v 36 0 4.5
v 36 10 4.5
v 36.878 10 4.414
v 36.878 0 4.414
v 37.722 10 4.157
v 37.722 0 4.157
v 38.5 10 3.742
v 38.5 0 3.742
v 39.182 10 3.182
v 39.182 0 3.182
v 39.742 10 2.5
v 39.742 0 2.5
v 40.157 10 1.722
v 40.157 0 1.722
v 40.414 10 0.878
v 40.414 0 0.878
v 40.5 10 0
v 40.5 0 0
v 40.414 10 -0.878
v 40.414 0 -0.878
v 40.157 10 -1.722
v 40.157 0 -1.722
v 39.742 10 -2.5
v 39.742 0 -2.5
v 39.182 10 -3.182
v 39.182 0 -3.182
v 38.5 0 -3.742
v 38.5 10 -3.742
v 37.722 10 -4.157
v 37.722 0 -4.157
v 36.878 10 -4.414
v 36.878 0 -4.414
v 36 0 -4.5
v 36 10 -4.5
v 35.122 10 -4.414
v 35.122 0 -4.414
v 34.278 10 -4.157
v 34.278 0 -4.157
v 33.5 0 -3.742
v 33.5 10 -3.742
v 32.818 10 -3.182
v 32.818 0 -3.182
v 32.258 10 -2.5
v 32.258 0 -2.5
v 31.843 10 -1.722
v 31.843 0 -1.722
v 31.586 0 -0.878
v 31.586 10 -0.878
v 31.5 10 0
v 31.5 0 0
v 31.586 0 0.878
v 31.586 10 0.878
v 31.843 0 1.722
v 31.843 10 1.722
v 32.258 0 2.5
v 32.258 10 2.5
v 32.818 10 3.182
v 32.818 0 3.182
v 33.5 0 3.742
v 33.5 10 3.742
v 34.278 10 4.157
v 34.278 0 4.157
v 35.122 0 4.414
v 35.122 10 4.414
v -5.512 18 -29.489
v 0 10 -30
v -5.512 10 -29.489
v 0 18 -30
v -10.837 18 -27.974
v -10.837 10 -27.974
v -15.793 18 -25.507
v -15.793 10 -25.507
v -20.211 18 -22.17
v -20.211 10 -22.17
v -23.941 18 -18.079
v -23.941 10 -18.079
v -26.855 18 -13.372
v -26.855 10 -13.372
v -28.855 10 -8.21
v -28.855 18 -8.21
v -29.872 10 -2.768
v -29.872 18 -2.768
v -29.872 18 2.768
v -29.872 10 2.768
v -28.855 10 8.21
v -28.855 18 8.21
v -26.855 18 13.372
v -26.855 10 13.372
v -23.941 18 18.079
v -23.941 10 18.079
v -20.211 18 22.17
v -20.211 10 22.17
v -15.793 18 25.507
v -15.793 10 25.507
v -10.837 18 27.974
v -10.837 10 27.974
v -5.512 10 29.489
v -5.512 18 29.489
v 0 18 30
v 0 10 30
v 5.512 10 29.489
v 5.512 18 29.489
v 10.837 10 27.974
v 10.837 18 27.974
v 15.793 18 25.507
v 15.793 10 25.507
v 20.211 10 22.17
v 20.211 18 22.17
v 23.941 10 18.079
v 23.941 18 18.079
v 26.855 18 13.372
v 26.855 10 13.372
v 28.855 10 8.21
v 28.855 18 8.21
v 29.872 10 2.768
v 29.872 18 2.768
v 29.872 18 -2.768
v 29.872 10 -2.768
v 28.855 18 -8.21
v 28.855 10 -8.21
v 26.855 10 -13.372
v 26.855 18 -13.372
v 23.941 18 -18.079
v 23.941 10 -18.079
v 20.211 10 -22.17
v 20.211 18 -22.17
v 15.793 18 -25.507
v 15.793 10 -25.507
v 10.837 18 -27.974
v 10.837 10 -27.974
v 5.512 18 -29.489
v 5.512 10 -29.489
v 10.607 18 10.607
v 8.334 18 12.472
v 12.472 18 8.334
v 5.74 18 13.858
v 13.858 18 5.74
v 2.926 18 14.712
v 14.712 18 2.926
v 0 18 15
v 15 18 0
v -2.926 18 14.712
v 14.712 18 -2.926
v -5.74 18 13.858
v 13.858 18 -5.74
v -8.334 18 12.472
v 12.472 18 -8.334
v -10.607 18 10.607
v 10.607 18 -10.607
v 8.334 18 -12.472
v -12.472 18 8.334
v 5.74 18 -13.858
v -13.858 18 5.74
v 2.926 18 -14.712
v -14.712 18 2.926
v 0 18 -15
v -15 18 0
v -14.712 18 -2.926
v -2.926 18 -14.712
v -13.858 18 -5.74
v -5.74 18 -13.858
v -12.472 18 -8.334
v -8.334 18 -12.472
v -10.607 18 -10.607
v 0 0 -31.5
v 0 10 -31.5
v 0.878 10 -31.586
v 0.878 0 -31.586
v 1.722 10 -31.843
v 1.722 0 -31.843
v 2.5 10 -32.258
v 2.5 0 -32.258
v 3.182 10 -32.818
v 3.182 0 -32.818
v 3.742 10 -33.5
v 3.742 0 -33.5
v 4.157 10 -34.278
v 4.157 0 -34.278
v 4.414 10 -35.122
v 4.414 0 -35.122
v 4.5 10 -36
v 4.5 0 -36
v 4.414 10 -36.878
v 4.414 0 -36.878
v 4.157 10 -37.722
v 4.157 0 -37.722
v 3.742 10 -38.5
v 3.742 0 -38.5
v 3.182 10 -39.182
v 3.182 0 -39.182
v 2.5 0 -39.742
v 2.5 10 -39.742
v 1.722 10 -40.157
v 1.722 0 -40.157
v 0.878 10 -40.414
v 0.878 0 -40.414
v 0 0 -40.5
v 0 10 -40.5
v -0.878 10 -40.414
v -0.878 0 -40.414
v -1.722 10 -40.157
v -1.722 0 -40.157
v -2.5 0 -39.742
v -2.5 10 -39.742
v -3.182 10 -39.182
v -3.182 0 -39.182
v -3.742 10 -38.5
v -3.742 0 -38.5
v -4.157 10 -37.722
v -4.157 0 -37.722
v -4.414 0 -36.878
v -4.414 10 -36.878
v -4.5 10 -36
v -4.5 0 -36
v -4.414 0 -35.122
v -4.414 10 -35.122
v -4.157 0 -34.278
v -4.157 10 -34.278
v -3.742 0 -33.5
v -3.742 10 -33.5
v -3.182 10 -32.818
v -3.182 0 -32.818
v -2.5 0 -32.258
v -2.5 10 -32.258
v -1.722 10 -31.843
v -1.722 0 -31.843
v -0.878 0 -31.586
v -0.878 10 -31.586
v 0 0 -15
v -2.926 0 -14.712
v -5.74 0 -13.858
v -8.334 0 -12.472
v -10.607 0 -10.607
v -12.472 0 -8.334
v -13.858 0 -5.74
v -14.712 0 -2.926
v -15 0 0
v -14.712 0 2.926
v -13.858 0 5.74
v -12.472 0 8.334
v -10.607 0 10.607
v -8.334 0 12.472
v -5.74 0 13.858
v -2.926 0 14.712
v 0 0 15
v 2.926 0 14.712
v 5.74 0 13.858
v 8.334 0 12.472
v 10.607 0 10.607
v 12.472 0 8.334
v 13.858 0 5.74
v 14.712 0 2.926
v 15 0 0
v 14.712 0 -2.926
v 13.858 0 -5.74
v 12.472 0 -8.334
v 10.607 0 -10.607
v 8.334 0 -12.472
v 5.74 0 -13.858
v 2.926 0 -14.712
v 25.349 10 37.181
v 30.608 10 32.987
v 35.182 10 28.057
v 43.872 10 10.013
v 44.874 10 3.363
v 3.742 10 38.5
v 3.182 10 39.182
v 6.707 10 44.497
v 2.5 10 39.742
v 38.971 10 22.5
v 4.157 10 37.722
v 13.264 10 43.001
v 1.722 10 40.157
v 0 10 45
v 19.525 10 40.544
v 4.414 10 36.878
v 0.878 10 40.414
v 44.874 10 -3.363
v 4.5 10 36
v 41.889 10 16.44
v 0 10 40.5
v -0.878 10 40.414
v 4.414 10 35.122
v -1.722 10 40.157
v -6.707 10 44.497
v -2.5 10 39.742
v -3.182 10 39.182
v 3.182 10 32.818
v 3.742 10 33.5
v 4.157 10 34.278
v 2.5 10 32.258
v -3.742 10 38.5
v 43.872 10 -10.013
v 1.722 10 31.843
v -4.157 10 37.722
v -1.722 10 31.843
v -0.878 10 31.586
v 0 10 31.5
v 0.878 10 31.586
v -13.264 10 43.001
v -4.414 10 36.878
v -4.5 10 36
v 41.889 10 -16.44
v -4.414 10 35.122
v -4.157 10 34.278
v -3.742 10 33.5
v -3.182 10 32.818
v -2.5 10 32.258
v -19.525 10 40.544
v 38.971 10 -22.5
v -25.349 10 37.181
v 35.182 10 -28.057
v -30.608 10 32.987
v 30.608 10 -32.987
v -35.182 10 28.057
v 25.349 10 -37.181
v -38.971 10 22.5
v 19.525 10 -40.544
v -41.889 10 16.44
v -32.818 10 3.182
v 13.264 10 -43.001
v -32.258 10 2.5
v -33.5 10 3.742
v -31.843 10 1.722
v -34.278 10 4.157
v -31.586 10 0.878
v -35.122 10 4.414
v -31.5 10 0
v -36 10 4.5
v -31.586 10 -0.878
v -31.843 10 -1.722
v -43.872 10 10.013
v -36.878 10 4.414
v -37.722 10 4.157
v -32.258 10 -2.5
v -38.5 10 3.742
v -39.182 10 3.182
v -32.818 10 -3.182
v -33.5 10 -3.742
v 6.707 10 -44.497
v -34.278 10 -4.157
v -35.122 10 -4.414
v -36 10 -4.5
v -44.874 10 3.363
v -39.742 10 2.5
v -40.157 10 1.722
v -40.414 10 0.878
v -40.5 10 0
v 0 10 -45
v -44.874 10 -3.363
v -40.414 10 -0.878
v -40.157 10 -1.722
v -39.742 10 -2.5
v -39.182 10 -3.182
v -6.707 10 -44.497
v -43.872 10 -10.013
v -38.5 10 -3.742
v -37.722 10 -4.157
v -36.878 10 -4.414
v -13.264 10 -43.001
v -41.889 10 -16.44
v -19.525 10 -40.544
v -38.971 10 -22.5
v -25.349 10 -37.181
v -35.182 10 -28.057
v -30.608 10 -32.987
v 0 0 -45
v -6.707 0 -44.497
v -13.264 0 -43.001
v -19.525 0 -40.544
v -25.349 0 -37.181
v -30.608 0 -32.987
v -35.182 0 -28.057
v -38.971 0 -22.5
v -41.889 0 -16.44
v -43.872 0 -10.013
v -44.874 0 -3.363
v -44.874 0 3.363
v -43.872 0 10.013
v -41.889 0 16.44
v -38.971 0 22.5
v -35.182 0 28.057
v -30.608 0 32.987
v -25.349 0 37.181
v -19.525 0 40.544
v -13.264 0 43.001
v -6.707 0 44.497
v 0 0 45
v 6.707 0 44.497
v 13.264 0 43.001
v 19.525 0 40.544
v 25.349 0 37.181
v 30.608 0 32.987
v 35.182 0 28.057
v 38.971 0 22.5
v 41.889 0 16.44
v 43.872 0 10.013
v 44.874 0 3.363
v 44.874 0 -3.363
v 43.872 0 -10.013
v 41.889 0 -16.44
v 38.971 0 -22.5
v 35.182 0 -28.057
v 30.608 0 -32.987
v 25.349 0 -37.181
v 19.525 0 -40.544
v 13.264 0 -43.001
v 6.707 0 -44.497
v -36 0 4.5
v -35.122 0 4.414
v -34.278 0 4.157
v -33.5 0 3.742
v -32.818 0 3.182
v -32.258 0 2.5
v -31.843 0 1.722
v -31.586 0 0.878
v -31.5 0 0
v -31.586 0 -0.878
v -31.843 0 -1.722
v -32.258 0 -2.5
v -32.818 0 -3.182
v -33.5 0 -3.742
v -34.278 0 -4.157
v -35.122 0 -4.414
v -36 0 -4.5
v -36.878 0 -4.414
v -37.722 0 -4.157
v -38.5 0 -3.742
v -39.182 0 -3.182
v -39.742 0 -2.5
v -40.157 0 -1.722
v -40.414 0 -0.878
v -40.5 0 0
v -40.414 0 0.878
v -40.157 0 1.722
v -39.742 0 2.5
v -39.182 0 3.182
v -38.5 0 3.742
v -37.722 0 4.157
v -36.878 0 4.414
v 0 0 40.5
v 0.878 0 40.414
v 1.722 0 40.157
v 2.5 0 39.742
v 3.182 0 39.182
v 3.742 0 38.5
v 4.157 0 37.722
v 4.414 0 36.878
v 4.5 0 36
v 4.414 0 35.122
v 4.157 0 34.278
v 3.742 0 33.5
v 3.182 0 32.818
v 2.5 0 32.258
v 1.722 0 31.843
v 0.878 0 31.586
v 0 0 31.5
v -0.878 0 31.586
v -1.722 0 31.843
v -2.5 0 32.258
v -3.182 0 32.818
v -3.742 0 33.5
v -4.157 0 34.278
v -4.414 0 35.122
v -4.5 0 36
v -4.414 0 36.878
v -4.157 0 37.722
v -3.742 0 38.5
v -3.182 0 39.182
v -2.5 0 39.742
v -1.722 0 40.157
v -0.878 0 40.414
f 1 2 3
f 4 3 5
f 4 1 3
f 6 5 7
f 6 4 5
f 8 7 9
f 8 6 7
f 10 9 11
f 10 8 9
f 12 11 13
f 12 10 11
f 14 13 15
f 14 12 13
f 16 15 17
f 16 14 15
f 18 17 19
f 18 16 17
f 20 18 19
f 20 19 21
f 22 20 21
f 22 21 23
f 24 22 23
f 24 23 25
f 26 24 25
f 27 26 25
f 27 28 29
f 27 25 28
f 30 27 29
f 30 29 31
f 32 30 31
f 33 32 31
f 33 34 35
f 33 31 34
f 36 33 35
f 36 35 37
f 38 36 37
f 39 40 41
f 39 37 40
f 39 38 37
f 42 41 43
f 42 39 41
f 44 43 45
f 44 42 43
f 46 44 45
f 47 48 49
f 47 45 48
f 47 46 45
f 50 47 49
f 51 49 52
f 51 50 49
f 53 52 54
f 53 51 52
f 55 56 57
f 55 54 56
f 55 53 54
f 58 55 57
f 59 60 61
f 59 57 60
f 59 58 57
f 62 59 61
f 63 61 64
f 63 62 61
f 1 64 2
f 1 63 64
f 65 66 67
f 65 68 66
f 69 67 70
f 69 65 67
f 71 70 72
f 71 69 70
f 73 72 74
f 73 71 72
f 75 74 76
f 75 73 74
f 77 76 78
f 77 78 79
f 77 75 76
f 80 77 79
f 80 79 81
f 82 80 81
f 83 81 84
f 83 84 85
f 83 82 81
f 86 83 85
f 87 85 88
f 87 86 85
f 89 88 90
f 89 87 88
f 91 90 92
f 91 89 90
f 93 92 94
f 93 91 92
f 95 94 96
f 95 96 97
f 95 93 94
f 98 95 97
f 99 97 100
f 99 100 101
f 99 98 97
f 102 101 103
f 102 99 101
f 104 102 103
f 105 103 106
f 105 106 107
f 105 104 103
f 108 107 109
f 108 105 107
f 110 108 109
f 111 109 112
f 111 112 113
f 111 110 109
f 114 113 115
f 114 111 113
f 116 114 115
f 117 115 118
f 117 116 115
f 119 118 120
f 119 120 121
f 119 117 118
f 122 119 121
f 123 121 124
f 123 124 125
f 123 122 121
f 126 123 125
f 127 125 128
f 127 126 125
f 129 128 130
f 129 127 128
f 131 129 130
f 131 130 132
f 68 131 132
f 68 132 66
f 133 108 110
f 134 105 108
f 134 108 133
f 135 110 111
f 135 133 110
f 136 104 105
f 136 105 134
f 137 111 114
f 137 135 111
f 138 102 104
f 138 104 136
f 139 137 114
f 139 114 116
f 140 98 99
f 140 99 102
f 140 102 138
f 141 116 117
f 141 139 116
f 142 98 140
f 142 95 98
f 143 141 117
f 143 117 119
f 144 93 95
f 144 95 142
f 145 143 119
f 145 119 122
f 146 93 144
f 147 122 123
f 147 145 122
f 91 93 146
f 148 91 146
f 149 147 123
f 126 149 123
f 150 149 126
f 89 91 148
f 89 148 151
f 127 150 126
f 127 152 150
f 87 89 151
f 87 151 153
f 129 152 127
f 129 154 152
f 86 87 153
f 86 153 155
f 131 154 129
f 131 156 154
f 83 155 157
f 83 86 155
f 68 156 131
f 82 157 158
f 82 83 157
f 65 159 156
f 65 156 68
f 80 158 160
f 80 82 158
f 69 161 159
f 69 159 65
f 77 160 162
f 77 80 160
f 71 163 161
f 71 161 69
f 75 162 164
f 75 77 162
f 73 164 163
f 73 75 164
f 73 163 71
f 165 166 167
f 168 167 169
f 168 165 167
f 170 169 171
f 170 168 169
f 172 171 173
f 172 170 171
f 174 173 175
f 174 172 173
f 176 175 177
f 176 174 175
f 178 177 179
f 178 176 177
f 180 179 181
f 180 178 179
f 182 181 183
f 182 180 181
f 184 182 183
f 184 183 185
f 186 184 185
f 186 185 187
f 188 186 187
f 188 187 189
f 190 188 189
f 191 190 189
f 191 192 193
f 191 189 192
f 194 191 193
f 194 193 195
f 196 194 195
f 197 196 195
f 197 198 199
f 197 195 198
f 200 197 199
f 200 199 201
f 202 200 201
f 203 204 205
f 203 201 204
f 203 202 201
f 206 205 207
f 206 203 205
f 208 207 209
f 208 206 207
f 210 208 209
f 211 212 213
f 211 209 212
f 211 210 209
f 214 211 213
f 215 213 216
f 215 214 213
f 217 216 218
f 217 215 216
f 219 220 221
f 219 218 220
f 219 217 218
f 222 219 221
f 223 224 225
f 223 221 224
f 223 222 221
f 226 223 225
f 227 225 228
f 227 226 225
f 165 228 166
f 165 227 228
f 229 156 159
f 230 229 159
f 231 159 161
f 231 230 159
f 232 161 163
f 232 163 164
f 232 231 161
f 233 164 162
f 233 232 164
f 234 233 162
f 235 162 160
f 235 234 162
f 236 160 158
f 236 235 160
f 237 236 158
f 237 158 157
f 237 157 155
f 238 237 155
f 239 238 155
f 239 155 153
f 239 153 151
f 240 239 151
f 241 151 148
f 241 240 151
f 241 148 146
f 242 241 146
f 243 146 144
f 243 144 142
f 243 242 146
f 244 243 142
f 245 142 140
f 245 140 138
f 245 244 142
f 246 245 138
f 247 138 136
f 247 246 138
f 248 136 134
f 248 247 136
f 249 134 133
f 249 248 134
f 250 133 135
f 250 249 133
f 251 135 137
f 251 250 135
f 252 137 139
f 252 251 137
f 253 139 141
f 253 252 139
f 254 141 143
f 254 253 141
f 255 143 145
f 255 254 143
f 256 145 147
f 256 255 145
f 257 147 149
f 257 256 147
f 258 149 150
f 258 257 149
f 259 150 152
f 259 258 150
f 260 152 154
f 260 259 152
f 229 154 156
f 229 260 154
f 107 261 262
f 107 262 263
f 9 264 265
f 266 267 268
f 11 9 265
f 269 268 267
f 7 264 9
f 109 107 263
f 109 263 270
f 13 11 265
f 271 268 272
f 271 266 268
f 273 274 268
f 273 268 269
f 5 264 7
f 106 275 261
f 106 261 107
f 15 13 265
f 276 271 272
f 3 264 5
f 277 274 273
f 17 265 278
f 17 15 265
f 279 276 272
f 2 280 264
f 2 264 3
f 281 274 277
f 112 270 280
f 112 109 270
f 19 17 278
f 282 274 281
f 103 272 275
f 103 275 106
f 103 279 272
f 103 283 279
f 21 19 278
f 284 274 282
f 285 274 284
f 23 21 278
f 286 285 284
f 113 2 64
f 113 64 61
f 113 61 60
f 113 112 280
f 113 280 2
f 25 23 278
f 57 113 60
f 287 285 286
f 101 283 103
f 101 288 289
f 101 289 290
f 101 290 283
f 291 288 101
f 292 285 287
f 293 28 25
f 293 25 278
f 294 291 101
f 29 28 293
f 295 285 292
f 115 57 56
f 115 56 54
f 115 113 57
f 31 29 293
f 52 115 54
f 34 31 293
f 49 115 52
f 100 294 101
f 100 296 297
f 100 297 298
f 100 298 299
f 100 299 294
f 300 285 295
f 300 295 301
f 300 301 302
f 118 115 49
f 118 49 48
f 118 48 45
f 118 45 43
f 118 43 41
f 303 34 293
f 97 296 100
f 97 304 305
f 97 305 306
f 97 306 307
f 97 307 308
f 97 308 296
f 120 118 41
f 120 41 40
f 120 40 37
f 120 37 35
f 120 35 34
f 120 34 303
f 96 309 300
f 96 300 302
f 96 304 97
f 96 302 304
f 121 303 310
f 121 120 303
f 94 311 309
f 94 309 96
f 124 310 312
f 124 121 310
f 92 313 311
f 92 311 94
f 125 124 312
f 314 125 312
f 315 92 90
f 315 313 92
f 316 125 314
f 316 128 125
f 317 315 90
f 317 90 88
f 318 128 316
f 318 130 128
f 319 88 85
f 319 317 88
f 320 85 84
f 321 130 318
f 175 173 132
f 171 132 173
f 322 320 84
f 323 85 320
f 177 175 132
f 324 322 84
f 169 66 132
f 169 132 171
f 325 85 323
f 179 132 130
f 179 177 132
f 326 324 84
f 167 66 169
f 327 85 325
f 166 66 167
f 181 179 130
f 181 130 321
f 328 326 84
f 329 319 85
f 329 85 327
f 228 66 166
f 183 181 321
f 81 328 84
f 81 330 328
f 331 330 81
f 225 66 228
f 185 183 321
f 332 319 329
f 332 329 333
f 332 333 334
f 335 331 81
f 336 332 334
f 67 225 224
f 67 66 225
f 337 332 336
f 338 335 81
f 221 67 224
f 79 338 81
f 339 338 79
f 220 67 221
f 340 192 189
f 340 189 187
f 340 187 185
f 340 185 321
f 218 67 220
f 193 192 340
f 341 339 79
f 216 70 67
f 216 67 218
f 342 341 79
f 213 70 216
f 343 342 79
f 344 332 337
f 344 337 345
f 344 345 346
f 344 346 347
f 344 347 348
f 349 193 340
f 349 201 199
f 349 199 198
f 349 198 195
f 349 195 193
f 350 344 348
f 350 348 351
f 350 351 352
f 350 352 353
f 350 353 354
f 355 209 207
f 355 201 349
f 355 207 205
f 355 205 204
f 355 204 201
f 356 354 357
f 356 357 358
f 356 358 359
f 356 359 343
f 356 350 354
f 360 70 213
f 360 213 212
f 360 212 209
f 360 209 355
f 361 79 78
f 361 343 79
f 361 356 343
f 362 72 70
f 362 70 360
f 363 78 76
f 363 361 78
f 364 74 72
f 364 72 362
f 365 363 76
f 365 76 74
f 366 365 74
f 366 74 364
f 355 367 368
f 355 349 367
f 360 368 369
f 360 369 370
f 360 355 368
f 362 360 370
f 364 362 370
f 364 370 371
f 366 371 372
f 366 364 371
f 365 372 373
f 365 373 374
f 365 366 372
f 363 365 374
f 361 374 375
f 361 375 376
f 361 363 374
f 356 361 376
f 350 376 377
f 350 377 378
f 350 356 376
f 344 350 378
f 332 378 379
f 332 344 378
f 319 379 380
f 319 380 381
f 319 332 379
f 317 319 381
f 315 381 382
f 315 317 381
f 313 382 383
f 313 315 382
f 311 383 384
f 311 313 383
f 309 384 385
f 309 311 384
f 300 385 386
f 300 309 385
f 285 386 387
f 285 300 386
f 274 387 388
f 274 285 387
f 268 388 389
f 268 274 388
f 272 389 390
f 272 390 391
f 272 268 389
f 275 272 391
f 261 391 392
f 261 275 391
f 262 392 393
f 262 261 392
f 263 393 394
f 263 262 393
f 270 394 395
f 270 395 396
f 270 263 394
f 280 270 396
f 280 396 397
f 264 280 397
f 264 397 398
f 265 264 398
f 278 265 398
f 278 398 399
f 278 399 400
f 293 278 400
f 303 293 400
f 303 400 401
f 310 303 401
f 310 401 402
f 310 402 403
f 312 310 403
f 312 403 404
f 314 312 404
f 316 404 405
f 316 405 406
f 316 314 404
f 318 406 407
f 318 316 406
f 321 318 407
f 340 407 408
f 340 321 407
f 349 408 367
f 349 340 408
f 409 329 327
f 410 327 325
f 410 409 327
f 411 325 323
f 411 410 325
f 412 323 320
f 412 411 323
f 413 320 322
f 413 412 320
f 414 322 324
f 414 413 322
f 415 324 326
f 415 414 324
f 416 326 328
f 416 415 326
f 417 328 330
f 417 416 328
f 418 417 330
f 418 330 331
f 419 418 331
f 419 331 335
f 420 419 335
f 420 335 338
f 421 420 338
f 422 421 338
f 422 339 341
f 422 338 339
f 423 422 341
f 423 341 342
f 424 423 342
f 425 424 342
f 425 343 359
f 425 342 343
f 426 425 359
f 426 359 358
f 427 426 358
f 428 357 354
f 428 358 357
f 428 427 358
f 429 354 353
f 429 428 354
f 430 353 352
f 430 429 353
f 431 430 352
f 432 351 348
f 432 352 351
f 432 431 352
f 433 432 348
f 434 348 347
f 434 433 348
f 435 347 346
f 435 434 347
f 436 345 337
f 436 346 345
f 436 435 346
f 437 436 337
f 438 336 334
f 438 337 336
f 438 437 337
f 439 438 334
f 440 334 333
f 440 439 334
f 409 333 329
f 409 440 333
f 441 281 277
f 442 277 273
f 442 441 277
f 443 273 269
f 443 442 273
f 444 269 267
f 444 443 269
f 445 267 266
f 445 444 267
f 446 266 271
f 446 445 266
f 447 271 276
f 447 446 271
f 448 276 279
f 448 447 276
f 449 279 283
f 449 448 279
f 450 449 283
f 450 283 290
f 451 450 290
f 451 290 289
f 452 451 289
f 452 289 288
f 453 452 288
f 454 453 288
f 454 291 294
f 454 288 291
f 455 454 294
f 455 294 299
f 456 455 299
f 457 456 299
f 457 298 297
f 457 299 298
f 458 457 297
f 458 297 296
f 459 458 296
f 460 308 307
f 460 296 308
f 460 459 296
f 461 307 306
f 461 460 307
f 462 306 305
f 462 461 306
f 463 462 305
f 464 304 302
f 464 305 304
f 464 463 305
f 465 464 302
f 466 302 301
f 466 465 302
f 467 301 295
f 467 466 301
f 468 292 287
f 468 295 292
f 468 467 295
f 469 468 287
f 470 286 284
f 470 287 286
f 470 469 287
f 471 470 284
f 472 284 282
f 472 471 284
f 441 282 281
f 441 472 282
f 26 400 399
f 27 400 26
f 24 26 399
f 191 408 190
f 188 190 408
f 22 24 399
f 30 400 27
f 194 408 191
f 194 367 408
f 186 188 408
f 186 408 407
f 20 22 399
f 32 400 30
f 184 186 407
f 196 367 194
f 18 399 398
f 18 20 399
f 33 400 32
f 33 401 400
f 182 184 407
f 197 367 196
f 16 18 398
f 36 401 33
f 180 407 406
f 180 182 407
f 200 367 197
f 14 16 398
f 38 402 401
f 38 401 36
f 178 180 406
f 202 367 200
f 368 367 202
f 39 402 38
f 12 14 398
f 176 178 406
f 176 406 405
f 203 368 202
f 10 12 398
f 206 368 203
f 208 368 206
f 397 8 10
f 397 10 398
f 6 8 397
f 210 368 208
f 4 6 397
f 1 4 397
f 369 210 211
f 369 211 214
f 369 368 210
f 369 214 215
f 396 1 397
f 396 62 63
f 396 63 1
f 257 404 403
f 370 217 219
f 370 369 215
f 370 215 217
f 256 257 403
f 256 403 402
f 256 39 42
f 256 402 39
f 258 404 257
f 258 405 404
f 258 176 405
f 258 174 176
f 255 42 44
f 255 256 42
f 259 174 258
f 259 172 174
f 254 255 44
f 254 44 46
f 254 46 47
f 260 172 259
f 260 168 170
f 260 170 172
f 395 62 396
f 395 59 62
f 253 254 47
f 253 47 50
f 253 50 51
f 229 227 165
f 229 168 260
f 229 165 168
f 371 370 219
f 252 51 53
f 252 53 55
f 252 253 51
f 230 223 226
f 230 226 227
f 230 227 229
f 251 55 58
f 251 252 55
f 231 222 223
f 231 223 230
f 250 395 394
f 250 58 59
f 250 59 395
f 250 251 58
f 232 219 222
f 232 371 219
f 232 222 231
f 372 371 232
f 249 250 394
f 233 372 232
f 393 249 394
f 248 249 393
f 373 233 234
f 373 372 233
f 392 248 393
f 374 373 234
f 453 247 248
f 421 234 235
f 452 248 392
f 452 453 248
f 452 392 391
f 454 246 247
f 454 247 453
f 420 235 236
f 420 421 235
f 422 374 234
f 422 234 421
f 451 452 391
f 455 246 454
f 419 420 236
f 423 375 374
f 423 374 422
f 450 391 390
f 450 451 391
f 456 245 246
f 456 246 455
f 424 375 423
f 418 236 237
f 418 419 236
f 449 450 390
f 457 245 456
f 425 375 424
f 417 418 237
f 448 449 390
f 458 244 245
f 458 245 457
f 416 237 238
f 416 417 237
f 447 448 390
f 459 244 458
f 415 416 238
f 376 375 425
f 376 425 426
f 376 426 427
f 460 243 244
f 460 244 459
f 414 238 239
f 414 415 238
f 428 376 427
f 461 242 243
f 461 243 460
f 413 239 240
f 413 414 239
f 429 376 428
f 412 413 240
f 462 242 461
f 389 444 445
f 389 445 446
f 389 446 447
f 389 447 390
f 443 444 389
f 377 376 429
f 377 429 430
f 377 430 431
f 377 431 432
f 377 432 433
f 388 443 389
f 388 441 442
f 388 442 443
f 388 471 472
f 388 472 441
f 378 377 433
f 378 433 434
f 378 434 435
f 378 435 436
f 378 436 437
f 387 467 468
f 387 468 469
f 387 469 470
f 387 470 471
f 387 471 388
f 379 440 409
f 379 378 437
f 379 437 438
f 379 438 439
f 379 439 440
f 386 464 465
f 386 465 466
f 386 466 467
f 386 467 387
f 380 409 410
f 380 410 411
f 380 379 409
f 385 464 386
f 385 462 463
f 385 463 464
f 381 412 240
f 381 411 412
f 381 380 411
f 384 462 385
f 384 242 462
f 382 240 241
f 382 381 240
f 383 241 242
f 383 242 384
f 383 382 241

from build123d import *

# Parameters (mm, degrees)
SKETCH_2_R          = 4.5
CUT_EXTRUDE_1_DEPTH = 67.136223055


with BuildPart() as part:
    # 草图1 → 旋转1 (revolve)
    with BuildSketch(Plane.XY, mode=Mode.PRIVATE) as revolve_1_sk:
        Polygon((15, 0), (45, 0), (45, 10), (30, 10), (30, 18), (15, 18), align=None)
    revolve(revolve_1_sk.sketch.rotate(Axis((0, -10, 0), (0, 1, 0)), 90), axis=Axis((0, -10, 0), (0, 1, 0)))

    # 草图2 → 切除-拉伸1 (cut, through all)
    with BuildSketch(Plane(origin=(0, 0, 0), x_dir=(1, 0, 0), z_dir=(0, 1, 0))):
        with Locations(Location((36, 0, 0), (0, 0, 270))):
            Circle(SKETCH_2_R)
        with Locations(Location((0, 36, 0), (0, 0, 270))):
            Circle(SKETCH_2_R)
        with Locations(Location((-36, 0, 0), (0, 0, 270))):
            Circle(SKETCH_2_R)
        with Locations(Location((0, -36, 0), (0, 0, 270))):
            Circle(SKETCH_2_R)
    extrude(amount=CUT_EXTRUDE_1_DEPTH, mode=Mode.SUBTRACT)


solid = part.part
